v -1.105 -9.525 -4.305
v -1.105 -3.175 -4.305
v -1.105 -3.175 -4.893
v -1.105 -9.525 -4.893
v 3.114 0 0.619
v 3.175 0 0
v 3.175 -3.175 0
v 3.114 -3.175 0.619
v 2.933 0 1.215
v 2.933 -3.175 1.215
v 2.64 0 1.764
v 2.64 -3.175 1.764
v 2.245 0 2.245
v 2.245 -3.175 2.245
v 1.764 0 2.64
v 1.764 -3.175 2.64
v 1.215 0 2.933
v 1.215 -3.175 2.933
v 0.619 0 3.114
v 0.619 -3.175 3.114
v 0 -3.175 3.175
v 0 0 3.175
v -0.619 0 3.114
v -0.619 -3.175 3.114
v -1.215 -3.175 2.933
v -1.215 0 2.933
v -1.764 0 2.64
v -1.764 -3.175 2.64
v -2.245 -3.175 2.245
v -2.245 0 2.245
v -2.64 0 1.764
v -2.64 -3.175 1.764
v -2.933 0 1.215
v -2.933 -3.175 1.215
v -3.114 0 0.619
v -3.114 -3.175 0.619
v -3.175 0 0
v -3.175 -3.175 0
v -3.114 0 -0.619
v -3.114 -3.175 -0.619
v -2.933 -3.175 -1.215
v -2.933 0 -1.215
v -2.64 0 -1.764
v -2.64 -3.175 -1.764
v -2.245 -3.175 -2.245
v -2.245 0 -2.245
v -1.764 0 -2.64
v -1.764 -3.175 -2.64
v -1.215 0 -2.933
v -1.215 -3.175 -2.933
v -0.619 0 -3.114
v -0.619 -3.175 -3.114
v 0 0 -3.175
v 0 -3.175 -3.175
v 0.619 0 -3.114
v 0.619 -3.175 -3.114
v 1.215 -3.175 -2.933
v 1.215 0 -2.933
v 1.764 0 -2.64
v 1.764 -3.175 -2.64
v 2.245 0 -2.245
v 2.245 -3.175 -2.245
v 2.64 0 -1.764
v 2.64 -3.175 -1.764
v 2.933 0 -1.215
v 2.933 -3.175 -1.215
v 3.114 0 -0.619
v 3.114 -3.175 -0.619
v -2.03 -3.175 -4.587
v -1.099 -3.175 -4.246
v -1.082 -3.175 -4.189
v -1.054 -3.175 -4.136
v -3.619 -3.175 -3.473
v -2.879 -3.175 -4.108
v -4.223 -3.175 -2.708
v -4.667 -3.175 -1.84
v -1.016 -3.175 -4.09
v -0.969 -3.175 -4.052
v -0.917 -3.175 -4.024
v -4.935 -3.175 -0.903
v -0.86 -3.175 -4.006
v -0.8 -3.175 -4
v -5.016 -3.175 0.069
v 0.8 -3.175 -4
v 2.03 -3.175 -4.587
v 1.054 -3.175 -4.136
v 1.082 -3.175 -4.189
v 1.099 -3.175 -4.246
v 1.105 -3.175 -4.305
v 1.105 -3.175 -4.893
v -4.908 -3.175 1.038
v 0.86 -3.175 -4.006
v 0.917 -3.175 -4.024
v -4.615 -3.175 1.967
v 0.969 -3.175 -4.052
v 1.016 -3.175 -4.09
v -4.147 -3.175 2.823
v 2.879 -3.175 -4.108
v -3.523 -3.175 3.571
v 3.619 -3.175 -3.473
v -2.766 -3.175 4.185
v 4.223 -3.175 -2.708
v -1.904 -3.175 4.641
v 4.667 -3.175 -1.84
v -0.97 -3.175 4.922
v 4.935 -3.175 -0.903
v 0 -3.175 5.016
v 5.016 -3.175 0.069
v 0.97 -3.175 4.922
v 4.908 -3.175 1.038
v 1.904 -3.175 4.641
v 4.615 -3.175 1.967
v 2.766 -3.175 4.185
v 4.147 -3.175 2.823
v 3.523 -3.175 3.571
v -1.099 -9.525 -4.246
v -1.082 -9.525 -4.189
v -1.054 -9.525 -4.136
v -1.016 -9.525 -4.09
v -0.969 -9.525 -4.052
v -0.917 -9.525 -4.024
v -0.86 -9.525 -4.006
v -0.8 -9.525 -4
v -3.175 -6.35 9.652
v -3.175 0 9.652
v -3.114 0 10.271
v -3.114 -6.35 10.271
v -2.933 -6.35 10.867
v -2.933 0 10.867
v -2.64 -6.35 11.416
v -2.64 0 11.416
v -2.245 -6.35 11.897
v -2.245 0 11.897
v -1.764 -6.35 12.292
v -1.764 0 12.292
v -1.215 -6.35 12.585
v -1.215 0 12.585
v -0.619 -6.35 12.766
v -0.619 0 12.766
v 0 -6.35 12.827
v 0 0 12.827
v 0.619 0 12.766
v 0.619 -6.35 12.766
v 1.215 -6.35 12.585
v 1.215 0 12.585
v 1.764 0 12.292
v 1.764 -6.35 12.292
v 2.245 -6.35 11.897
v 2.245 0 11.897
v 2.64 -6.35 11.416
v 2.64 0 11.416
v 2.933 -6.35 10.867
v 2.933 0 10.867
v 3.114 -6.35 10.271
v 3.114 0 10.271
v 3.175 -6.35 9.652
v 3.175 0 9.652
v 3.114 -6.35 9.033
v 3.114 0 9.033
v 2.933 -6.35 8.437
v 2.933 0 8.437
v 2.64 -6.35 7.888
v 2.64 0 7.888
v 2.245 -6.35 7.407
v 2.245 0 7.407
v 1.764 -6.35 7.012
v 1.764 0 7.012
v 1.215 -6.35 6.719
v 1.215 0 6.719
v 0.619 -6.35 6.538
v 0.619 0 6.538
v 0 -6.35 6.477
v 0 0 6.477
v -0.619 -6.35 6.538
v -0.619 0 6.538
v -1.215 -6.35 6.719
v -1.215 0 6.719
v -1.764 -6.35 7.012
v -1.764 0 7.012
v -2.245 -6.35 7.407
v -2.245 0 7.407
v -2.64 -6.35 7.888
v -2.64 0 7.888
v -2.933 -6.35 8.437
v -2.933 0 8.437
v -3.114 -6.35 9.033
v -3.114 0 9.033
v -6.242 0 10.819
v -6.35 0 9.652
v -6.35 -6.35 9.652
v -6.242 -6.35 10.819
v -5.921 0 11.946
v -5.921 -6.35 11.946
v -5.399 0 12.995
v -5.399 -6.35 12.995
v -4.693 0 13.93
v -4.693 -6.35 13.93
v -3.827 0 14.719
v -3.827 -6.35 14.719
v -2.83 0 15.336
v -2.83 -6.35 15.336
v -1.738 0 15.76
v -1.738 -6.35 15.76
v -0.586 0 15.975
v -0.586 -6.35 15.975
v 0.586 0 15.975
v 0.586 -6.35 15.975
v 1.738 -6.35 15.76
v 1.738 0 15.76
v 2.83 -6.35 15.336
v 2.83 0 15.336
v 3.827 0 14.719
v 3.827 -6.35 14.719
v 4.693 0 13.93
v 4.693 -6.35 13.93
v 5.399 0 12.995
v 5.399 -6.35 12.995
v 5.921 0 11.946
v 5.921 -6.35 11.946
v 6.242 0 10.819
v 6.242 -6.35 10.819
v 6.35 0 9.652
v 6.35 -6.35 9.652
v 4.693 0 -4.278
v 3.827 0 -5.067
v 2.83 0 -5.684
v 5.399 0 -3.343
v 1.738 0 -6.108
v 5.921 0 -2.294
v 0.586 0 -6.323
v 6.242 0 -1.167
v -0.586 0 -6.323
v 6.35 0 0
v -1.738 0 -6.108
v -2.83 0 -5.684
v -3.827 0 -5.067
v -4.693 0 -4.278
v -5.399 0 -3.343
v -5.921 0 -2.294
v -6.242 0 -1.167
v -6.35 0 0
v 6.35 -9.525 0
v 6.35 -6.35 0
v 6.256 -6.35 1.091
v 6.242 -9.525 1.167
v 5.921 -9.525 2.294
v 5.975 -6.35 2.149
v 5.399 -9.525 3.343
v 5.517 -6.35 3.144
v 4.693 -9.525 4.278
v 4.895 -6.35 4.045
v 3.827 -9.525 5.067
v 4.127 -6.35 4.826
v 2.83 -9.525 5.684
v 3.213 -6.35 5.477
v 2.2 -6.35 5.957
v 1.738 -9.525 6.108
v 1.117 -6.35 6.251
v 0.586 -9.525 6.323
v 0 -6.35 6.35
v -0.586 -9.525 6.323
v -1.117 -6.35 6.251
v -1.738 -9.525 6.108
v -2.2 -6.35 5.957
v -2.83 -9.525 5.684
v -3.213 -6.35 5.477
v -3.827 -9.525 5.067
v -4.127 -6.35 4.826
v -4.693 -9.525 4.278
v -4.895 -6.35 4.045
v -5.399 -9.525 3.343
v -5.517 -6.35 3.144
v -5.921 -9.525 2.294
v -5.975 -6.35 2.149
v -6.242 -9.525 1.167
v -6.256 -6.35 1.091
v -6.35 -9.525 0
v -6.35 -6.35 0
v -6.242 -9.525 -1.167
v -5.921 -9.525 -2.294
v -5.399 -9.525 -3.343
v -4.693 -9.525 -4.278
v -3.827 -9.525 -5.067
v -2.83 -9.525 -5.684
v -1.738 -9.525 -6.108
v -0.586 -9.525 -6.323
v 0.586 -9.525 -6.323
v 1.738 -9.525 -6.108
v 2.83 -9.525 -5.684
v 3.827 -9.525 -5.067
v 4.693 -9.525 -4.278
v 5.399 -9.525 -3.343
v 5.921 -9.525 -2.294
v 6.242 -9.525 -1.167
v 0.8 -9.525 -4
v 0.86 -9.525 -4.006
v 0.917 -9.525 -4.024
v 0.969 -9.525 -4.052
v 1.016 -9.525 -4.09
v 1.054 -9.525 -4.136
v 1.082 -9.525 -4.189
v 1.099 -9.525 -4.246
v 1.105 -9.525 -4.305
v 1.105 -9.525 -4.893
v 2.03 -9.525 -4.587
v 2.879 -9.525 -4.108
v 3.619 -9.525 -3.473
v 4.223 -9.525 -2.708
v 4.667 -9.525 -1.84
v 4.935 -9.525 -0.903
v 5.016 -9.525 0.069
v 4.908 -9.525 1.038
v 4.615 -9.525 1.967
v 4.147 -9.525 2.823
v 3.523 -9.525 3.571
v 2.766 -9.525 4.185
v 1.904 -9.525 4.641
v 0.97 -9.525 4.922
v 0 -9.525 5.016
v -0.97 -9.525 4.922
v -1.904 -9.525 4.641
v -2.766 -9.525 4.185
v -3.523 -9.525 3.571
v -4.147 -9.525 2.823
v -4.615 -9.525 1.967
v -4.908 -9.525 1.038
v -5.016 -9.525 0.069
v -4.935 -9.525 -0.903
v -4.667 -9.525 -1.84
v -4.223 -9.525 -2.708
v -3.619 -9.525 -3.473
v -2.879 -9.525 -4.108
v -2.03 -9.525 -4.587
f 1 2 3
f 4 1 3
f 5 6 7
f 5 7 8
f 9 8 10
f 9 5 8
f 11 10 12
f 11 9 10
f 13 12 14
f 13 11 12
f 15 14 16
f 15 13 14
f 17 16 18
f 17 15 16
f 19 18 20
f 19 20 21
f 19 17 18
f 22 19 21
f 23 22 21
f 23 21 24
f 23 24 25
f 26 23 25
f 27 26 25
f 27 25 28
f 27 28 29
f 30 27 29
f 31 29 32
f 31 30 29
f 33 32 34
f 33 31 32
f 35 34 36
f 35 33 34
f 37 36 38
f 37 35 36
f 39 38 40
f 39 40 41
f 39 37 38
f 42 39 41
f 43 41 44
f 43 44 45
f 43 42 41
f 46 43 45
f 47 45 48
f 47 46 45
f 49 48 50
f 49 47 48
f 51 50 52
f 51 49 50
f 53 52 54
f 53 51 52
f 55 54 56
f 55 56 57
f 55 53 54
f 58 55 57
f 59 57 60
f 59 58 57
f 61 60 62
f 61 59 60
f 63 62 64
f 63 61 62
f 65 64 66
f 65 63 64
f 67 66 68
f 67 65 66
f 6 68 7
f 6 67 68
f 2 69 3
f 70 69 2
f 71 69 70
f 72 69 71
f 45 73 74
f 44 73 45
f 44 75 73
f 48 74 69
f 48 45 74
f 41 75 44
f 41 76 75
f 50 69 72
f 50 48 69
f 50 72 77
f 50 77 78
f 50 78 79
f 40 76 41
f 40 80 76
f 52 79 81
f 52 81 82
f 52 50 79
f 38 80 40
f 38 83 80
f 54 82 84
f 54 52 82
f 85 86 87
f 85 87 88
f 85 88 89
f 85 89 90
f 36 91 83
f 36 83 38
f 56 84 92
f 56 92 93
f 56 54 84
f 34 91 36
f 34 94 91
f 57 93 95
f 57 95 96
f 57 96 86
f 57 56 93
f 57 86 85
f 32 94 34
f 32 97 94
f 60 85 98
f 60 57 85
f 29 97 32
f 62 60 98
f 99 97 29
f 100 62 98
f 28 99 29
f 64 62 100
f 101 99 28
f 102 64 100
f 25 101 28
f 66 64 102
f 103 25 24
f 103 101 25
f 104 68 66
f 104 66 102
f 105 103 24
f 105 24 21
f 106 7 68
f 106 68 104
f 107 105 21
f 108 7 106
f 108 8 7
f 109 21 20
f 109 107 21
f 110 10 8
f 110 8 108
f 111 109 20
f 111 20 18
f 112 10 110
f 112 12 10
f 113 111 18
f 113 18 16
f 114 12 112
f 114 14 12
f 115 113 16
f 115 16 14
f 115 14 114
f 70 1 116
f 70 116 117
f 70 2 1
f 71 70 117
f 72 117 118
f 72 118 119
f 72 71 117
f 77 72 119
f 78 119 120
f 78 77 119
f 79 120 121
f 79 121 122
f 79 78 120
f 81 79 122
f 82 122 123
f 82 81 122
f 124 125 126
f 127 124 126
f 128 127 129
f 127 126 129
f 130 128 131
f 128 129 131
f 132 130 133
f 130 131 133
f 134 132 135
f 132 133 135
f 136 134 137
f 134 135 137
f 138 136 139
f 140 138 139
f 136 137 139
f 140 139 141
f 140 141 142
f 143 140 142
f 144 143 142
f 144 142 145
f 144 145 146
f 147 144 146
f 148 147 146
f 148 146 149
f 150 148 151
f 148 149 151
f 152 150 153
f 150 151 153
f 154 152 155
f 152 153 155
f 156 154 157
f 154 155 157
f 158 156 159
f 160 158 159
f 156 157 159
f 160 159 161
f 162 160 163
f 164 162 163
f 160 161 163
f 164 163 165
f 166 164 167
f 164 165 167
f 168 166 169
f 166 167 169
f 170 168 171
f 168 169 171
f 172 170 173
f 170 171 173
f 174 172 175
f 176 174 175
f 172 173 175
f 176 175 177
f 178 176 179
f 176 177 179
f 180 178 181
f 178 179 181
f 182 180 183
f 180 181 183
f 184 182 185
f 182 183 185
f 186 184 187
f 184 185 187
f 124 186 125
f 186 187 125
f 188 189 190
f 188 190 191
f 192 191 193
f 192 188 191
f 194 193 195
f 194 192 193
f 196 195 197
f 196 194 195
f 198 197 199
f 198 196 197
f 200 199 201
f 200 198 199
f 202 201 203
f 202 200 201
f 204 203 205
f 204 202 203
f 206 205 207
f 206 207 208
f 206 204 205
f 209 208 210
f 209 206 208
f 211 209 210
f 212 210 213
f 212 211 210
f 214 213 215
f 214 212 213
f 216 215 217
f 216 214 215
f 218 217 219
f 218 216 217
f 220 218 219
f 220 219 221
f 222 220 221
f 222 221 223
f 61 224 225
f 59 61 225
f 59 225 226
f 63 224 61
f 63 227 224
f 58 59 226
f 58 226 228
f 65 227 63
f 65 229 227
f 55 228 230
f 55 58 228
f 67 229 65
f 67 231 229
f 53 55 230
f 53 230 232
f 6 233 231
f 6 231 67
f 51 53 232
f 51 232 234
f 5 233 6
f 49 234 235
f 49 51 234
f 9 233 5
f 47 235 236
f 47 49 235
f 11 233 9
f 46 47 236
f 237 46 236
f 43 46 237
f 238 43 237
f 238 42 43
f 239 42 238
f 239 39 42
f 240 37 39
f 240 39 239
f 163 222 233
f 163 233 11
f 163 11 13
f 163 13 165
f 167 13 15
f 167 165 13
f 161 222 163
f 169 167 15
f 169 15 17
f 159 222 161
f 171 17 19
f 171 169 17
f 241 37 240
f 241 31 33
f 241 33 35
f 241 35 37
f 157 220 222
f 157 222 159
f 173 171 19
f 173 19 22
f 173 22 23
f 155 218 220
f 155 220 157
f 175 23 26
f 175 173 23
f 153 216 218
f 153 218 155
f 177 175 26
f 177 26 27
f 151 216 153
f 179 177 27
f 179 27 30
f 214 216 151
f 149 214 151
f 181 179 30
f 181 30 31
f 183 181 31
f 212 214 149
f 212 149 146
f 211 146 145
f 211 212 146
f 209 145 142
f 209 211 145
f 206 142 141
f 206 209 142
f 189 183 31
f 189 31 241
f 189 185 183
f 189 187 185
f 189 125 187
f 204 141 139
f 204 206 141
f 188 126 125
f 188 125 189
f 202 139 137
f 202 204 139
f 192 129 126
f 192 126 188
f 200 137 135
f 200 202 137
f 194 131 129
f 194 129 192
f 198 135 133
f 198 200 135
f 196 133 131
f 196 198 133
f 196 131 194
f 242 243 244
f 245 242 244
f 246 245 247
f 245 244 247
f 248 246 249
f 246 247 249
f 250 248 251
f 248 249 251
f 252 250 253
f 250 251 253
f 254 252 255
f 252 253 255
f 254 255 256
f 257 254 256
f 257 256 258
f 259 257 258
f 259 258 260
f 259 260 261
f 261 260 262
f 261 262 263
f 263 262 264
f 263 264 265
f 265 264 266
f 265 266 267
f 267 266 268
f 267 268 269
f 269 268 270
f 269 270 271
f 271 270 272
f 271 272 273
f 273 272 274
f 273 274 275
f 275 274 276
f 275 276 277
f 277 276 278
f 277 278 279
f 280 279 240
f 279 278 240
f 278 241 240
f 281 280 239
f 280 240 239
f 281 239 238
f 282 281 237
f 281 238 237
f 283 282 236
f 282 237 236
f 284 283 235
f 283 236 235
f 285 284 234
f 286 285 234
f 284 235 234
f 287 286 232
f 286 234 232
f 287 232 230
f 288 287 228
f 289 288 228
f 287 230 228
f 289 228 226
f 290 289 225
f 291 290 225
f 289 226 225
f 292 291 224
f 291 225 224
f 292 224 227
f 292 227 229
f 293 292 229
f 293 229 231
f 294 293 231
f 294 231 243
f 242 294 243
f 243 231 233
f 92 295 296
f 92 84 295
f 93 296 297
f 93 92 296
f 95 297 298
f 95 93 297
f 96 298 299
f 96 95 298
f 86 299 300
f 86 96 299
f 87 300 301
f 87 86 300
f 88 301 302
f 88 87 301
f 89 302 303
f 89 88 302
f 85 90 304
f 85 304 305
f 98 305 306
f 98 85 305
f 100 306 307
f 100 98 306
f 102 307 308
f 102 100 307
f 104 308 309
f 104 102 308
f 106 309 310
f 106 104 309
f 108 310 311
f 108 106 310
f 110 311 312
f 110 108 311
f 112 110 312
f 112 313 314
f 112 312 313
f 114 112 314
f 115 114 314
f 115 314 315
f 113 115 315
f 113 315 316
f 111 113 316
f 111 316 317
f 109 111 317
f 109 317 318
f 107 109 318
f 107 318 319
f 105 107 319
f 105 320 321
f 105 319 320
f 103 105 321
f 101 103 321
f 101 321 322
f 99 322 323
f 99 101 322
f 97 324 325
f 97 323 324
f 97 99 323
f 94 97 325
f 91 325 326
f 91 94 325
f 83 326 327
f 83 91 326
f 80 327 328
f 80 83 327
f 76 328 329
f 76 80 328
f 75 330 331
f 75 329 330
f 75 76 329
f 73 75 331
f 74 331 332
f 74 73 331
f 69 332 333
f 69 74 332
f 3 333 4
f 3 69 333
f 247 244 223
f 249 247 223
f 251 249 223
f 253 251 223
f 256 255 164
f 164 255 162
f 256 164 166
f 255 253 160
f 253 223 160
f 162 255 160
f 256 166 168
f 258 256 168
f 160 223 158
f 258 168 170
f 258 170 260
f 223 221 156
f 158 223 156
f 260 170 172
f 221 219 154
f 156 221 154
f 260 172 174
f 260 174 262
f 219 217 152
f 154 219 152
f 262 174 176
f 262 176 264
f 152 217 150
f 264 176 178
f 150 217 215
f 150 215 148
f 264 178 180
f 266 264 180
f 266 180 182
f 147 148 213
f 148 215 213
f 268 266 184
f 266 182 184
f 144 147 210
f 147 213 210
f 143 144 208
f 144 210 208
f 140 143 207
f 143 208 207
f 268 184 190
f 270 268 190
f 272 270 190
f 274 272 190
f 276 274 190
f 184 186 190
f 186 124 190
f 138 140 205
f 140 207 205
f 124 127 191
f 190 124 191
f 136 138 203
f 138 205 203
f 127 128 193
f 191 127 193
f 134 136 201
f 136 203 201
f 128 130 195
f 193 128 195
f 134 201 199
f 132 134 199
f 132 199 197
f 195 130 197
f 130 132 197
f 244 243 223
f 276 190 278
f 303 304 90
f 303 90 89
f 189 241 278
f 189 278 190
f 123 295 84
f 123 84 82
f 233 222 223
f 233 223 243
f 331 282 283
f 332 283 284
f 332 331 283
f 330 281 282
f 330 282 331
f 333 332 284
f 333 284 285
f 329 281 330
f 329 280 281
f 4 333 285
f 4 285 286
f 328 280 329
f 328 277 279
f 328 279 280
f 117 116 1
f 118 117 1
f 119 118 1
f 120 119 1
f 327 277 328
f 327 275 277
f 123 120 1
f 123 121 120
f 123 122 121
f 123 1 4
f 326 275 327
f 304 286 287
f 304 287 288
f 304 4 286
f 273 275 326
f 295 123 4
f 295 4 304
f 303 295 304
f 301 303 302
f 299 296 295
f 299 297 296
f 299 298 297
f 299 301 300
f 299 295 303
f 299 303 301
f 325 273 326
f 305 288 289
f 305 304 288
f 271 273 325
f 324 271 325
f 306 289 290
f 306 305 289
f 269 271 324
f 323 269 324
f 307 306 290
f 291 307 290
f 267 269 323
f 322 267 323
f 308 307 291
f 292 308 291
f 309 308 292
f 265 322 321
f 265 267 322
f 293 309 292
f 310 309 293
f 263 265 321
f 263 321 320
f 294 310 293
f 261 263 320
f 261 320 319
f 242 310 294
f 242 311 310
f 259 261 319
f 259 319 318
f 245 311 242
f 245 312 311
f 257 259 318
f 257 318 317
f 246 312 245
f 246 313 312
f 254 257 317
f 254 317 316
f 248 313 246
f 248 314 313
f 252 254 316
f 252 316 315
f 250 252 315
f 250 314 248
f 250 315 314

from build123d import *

# Parameters (mm, degrees)
F0_R     = 6.35
F0_R_2   = 3.175
F1_DEPTH = 3.175
F2_R     = 6.35
F2_R_2   = 5.0165
F3_DEPTH = 6.35
F4_R     = 3.175
F5_DEPTH = 6.35
F7_DEPTH = 6.35
F8_R     = 0.3048


# Not quite as in the source:
# - a feature names something its author has since deleted; it is built from what else it names


with BuildPart() as f1:
    # F0 (on Front) → F1 (new body)
    with BuildSketch(Plane.XZ):
        Circle(F0_R)
        Circle(F0_R_2, mode=Mode.SUBTRACT)
    extrude(amount=F1_DEPTH)

    # F2 (on face) → F3 (join)
    with BuildSketch(Plane.XZ.offset(3.175)):
        Circle(F2_R)
        Circle(F2_R_2, mode=Mode.SUBTRACT)
    extrude(amount=F3_DEPTH)

    # F4 (on face) → F5 (join)
    with BuildSketch(Plane(origin=(0, 0, 0), x_dir=(-1, 0, 0), z_dir=(0, 1, 0))):
        with BuildLine():
            ThreePointArc((-6.35, 9.652), (-5.7675394704, 6.9953125029), (-4.1270115096, 4.826))
            ThreePointArc((-4.1270115096, 4.826), (0, 6.35), (4.1270115096, 4.826))
            ThreePointArc((4.1270115096, 4.826), (5.7675394704, 6.9953125029), (6.35, 9.652))
            ThreePointArc((6.35, 9.652), (0, 16.002), (-6.35, 9.652))
        make_face()
        with Locations((0, 9.652)):
            Circle(F4_R, mode=Mode.SUBTRACT)
        with BuildLine():
            Line((-6.35, 9.652), (-6.35, 0))
            ThreePointArc((-6.35, 0), (-5.7675394704, 2.6566874971), (-4.1270115096, 4.826))
            ThreePointArc((-4.1270115096, 4.826), (-5.7675394704, 6.9953125029), (-6.35, 9.652))
        make_face()
        with BuildLine():
            ThreePointArc((4.1270115096, 4.826), (5.7675394704, 2.6566874971), (6.35, 0))
            Line((6.35, 0), (6.35, 9.652))
            ThreePointArc((6.35, 9.652), (5.7675394704, 6.9953125029), (4.1270115096, 4.826))
        make_face()
    extrude(amount=-F5_DEPTH)

    # F6 (on face) → F7 (join, through all)
    with BuildSketch(Plane.XZ.offset(9.525)):
        with BuildLine():
            Line((-1.1049, -4.0005), (-1.1049, -4.8933085167))
            ThreePointArc((-1.1049, -4.8933085167), (0, -5.0165), (1.1049, -4.8933085167))
            Line((1.1049, -4.8933085167), (1.1049, -4.0005))
            Line((1.1049, -4.0005), (-1.1049, -4.0005))
        make_face()
    extrude(amount=-F7_DEPTH)

    # F8
    f8_edges = [f1.edges().sort_by_distance(p)[0] for p in [
        (1.1049, -6.35, -4.0005),
        (-1.1049, -6.35, -4.0005),
    ]]
    fillet(f8_edges, radius=F8_R)


solid = f1.part
